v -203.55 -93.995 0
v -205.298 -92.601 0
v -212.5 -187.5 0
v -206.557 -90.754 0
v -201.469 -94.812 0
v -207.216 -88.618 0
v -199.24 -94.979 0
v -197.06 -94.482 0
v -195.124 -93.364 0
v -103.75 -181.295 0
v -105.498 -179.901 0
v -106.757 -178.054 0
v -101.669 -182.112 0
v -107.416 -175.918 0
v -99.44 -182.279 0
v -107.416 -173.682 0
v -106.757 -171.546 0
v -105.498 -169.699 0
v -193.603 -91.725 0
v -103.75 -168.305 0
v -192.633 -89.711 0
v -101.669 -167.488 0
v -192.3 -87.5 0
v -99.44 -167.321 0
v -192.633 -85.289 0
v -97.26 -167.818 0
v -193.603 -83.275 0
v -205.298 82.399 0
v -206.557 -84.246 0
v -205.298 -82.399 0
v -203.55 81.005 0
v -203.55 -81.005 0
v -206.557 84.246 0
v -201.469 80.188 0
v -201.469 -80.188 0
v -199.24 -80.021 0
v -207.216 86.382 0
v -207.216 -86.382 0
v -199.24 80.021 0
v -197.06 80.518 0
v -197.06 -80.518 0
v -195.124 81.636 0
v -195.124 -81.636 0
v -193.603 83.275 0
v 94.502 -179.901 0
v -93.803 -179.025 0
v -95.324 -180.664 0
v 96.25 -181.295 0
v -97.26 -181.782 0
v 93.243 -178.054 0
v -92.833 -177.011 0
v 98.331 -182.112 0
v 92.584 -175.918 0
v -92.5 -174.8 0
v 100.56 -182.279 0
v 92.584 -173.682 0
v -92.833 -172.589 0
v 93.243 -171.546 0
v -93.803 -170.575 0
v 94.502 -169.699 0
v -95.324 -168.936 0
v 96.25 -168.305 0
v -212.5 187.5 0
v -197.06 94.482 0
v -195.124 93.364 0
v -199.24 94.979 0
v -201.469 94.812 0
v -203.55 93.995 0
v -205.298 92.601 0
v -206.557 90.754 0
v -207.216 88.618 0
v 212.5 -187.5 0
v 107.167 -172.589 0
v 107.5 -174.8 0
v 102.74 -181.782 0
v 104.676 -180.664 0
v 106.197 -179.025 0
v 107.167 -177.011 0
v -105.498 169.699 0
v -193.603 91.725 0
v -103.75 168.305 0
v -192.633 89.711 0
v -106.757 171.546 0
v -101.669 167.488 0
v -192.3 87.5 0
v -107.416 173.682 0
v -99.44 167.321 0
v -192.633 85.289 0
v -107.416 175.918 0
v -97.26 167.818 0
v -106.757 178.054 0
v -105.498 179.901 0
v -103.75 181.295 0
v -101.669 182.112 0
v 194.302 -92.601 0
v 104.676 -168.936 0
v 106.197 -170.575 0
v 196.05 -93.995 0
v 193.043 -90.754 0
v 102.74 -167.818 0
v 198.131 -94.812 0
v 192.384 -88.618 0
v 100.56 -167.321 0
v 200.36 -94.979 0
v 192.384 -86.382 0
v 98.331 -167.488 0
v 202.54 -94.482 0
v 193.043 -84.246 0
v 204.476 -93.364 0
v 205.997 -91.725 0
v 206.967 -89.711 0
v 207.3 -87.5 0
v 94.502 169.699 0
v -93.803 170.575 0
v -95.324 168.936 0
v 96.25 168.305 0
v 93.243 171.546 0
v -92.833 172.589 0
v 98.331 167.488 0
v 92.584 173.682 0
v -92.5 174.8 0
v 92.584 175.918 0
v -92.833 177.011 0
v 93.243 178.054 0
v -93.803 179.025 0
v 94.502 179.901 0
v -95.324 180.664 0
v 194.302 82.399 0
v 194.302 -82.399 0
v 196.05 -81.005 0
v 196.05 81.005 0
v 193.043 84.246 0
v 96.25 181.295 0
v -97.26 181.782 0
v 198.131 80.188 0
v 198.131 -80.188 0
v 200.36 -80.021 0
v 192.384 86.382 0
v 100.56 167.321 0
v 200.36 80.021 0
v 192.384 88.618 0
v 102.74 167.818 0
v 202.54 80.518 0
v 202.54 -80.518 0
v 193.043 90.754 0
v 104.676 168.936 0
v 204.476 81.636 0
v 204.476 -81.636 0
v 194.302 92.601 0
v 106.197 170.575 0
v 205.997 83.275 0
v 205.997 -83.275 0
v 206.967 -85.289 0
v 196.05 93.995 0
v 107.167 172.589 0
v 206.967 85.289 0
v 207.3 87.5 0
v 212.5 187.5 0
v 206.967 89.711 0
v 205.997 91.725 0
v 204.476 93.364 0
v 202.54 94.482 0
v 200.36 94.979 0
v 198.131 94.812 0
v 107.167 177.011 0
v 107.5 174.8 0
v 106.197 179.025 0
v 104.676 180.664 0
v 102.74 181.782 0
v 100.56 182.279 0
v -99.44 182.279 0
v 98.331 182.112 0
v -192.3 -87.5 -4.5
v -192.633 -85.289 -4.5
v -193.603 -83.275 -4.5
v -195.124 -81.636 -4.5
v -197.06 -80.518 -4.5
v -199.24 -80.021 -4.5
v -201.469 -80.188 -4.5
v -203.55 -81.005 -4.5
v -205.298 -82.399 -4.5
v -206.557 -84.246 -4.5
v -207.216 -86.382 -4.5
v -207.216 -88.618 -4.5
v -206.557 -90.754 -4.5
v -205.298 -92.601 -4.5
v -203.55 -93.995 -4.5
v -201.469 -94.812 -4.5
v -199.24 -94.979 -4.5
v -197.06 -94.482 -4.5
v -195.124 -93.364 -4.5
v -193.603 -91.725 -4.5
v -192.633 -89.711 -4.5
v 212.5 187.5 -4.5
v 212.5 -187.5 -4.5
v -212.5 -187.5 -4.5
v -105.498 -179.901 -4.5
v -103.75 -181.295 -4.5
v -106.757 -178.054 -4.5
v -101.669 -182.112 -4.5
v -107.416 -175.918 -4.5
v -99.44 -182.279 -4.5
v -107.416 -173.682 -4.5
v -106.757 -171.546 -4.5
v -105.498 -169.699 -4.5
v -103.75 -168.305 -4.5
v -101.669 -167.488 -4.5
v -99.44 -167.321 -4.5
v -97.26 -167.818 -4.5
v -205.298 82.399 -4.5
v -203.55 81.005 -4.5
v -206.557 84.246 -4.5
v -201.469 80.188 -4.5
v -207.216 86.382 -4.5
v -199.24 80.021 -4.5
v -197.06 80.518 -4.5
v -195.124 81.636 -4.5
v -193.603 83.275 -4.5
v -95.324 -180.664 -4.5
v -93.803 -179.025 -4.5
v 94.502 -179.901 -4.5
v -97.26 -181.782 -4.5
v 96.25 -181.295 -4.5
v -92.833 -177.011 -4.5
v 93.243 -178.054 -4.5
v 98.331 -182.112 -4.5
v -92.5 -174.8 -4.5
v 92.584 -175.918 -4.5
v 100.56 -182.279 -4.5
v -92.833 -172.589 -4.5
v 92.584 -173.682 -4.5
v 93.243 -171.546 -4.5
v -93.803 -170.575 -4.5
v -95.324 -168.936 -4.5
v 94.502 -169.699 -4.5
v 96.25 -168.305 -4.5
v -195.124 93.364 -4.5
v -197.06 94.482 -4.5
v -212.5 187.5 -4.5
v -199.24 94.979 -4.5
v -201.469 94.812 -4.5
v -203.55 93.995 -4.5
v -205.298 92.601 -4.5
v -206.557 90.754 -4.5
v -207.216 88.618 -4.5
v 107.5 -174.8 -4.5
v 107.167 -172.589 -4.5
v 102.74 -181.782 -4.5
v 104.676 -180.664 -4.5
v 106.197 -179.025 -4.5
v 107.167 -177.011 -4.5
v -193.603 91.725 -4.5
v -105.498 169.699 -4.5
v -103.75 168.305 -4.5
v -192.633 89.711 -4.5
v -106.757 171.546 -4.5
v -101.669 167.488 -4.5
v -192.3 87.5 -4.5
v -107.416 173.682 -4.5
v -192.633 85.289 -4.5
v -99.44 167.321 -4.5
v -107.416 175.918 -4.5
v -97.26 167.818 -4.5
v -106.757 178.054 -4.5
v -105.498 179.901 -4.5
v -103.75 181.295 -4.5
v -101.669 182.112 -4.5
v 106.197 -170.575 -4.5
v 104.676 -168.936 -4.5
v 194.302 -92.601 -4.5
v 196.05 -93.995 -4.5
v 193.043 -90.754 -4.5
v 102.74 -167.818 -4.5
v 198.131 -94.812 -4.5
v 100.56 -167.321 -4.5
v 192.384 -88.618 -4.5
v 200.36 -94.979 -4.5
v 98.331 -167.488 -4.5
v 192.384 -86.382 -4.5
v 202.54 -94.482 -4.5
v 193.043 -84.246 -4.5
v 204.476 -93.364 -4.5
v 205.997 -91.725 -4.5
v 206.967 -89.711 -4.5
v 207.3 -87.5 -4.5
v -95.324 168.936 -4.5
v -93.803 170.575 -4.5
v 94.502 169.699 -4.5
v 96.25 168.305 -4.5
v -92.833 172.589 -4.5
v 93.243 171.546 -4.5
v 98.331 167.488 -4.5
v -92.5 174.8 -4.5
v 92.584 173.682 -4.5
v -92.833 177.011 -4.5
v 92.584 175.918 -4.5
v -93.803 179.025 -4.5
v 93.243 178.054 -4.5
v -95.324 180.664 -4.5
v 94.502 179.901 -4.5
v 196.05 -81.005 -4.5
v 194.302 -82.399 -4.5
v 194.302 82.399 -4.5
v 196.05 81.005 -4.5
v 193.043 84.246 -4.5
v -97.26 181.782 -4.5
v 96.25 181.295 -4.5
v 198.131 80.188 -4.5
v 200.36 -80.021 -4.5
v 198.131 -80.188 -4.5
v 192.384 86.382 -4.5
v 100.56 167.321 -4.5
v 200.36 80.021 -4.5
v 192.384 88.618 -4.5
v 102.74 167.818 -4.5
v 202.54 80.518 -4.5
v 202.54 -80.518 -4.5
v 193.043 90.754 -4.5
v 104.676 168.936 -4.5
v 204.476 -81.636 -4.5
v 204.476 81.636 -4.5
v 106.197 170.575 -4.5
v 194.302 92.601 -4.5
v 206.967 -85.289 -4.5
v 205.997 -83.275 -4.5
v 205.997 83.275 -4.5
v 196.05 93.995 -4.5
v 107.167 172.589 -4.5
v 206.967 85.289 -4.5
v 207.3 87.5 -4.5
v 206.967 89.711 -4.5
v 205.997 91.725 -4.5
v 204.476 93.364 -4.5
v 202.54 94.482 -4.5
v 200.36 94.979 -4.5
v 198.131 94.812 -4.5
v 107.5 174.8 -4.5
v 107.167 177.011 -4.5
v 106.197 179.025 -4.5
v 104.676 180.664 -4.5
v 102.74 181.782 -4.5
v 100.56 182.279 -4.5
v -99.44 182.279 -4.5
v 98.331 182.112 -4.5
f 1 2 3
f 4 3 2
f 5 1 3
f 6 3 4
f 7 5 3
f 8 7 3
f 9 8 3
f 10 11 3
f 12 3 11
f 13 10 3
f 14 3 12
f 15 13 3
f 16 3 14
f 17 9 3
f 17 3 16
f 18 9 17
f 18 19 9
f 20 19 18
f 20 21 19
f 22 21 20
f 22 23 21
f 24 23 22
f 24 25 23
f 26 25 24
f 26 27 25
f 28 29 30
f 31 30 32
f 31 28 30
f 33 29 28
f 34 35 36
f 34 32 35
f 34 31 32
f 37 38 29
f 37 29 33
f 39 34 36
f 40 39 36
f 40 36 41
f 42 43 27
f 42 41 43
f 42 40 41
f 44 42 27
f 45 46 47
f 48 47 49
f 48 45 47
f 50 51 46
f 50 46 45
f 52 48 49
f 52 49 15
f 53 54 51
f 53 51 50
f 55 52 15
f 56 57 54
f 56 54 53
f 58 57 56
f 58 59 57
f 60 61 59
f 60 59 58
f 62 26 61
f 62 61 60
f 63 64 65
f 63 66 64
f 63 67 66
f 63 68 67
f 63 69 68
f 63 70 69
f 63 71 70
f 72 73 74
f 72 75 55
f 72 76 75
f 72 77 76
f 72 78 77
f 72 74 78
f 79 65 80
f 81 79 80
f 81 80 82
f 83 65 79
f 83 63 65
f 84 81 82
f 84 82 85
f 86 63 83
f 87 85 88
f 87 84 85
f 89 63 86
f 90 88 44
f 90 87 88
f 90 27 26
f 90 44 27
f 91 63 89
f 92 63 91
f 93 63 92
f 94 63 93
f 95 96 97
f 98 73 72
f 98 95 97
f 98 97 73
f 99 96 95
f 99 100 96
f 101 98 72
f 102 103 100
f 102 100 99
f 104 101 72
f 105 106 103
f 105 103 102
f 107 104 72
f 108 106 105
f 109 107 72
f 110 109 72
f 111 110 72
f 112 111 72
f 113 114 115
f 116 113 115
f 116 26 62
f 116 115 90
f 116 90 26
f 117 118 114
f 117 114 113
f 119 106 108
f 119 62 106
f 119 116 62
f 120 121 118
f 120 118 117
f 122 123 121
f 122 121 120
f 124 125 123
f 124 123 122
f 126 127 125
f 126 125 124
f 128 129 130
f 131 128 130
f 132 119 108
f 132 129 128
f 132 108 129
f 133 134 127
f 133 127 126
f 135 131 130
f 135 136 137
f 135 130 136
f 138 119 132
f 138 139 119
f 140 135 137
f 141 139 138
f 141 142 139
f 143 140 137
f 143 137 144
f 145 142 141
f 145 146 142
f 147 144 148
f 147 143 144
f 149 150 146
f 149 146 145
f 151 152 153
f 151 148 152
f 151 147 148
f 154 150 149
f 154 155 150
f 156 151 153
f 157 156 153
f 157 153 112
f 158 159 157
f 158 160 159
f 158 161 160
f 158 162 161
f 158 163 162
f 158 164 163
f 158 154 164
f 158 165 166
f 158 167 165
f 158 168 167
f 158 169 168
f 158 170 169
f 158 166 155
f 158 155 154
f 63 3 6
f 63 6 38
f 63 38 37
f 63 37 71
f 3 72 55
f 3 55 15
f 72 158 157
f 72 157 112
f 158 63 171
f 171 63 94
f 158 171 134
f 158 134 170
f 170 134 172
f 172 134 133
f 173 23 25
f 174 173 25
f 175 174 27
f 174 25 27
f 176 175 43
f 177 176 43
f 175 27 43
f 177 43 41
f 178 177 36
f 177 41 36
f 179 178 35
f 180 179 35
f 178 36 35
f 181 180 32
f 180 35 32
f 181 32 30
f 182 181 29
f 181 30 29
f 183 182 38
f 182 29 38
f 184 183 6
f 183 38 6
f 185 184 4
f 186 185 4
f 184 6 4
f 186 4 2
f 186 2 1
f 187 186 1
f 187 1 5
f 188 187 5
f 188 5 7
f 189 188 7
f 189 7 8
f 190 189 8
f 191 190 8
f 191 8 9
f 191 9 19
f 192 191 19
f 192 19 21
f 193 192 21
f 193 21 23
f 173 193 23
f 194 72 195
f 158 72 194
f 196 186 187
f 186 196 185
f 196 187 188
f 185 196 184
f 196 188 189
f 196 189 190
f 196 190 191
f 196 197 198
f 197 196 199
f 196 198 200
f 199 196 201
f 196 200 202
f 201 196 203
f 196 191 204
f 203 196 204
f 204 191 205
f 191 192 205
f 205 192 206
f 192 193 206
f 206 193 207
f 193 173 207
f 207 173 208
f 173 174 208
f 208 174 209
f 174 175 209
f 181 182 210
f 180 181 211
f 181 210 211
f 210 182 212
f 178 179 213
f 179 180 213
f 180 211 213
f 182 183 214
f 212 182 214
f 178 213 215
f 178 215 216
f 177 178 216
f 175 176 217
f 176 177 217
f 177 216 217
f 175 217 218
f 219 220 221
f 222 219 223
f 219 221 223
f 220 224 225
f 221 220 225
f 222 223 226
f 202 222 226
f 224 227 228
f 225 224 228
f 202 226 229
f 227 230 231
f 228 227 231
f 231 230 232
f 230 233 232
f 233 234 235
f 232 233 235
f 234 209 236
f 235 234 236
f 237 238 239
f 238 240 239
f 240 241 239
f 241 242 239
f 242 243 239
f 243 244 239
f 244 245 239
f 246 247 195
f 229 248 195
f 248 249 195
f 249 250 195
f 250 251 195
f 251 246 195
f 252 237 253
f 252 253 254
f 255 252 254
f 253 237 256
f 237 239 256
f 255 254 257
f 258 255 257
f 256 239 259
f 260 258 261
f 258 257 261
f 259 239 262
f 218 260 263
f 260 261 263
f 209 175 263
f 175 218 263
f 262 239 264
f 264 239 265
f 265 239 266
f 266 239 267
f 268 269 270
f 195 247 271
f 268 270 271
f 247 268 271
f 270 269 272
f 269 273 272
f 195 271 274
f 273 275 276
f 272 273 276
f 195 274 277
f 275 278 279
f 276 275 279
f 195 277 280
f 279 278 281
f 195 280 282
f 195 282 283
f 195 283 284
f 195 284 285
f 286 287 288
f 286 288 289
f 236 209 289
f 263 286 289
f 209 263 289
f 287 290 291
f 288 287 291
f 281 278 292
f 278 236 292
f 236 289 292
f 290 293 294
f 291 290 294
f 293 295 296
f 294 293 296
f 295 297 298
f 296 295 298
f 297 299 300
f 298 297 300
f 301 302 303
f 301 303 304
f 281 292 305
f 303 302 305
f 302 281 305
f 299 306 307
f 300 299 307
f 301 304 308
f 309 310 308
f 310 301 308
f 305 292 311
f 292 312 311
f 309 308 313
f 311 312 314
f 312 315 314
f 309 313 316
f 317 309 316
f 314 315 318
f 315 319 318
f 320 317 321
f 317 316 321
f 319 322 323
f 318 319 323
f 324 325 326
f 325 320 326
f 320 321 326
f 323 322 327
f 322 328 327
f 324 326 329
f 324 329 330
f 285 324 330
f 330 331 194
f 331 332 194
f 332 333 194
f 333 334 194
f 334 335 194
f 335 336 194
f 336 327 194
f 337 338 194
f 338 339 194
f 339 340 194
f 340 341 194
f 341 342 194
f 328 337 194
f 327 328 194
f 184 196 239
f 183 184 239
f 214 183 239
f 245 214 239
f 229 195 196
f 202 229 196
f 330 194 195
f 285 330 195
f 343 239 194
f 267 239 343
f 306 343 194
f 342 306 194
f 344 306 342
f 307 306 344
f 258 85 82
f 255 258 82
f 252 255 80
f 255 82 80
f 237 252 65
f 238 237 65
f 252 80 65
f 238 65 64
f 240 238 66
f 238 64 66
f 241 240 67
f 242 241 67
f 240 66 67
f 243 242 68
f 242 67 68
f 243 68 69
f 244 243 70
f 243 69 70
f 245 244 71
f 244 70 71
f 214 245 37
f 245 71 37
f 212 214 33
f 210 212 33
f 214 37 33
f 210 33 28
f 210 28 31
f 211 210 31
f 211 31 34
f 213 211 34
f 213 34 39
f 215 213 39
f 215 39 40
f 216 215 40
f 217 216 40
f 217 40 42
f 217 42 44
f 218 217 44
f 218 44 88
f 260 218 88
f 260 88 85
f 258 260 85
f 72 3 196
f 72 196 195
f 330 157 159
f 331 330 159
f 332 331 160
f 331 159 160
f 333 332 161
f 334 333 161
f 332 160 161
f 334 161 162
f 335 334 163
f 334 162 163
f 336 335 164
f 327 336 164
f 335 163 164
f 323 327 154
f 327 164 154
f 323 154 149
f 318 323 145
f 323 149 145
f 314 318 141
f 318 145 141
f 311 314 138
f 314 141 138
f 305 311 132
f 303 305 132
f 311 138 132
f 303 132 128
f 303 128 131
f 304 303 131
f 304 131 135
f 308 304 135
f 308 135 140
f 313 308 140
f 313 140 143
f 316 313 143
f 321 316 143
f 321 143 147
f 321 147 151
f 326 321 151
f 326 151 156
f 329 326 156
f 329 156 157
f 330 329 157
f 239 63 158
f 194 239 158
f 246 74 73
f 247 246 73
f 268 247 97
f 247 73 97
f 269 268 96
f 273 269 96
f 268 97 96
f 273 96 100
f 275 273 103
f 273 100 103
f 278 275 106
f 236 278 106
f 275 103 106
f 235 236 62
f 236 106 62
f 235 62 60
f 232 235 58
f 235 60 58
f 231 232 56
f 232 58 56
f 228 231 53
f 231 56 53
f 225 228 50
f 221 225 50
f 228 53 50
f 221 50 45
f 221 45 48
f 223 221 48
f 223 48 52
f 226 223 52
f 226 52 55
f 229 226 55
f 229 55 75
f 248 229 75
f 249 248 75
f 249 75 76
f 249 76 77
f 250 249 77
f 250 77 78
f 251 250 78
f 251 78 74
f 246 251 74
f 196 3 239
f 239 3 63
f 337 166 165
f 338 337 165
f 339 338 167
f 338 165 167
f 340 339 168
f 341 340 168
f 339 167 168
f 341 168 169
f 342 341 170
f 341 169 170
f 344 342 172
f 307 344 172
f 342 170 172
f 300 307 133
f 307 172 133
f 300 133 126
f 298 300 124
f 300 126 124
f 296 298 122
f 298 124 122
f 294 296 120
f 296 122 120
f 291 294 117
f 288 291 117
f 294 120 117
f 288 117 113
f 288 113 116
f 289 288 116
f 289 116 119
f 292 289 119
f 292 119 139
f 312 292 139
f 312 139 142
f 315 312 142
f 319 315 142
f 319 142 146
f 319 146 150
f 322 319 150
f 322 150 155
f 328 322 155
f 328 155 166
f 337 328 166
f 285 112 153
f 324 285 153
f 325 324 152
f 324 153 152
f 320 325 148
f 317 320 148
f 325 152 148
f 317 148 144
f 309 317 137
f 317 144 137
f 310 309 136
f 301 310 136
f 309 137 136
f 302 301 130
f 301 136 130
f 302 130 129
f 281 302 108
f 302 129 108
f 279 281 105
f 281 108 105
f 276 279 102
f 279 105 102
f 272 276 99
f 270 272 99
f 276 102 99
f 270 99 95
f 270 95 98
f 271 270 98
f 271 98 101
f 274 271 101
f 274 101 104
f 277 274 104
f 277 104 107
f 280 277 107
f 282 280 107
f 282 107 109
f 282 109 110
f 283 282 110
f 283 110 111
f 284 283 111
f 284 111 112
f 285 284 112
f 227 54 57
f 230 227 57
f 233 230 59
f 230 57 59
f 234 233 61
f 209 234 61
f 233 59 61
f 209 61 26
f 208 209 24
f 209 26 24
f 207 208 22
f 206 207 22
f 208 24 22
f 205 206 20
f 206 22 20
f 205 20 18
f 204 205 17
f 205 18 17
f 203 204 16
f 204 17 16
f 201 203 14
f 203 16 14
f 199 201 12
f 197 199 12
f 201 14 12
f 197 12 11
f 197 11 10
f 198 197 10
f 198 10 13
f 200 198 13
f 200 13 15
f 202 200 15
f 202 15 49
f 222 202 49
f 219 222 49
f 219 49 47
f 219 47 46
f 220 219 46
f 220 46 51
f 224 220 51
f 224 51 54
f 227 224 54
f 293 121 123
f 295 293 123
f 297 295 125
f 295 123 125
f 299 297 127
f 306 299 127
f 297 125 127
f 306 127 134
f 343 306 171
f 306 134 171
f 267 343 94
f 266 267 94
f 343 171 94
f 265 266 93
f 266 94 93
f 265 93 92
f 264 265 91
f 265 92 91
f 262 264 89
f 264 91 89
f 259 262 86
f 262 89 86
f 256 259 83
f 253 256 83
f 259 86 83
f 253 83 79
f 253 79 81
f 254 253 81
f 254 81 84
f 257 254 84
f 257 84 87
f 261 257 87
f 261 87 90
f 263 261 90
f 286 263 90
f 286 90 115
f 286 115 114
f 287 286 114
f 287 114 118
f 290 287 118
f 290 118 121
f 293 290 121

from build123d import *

# Parameters (mm, degrees)
SKETCH1_W               = 425
SKETCH1_H               = 375
BOSS_EXTRUDE1_DEPTH     = 4.5
SKETCH2_R               = 7.5
CUT_EXTRUDE1_DEPTH      = 1
CUT_EXTRUDE1_DEPTH_BACK = 5.5


with BuildPart() as part:
    # Sketch1 → Boss-Extrude1 (new body)
    with BuildSketch(Plane.XY):
        Rectangle(SKETCH1_W, SKETCH1_H)
    extrude(amount=-BOSS_EXTRUDE1_DEPTH)

    # Sketch2 → Cut-Extrude1 (cut, two sides)
    with BuildSketch(Plane.XY) as cut_extrude1_sk:
        with Locations((-199.8, 87.5)):
            Circle(SKETCH2_R)
        with Locations((-100, 174.8)):
            Circle(SKETCH2_R)
        with Locations((100, 174.8)):
            Circle(SKETCH2_R)
        with Locations((199.8, 87.5)):
            Circle(SKETCH2_R)
        with Locations((-100, -174.8)):
            Circle(SKETCH2_R)
        with Locations((-199.8, -87.5)):
            Circle(SKETCH2_R)
        with Locations((199.8, -87.5)):
            Circle(SKETCH2_R)
        with Locations((100, -174.8)):
            Circle(SKETCH2_R)
    extrude(amount=CUT_EXTRUDE1_DEPTH, mode=Mode.SUBTRACT)
    extrude(cut_extrude1_sk.sketch, amount=-CUT_EXTRUDE1_DEPTH_BACK, mode=Mode.SUBTRACT)


solid = part.part
